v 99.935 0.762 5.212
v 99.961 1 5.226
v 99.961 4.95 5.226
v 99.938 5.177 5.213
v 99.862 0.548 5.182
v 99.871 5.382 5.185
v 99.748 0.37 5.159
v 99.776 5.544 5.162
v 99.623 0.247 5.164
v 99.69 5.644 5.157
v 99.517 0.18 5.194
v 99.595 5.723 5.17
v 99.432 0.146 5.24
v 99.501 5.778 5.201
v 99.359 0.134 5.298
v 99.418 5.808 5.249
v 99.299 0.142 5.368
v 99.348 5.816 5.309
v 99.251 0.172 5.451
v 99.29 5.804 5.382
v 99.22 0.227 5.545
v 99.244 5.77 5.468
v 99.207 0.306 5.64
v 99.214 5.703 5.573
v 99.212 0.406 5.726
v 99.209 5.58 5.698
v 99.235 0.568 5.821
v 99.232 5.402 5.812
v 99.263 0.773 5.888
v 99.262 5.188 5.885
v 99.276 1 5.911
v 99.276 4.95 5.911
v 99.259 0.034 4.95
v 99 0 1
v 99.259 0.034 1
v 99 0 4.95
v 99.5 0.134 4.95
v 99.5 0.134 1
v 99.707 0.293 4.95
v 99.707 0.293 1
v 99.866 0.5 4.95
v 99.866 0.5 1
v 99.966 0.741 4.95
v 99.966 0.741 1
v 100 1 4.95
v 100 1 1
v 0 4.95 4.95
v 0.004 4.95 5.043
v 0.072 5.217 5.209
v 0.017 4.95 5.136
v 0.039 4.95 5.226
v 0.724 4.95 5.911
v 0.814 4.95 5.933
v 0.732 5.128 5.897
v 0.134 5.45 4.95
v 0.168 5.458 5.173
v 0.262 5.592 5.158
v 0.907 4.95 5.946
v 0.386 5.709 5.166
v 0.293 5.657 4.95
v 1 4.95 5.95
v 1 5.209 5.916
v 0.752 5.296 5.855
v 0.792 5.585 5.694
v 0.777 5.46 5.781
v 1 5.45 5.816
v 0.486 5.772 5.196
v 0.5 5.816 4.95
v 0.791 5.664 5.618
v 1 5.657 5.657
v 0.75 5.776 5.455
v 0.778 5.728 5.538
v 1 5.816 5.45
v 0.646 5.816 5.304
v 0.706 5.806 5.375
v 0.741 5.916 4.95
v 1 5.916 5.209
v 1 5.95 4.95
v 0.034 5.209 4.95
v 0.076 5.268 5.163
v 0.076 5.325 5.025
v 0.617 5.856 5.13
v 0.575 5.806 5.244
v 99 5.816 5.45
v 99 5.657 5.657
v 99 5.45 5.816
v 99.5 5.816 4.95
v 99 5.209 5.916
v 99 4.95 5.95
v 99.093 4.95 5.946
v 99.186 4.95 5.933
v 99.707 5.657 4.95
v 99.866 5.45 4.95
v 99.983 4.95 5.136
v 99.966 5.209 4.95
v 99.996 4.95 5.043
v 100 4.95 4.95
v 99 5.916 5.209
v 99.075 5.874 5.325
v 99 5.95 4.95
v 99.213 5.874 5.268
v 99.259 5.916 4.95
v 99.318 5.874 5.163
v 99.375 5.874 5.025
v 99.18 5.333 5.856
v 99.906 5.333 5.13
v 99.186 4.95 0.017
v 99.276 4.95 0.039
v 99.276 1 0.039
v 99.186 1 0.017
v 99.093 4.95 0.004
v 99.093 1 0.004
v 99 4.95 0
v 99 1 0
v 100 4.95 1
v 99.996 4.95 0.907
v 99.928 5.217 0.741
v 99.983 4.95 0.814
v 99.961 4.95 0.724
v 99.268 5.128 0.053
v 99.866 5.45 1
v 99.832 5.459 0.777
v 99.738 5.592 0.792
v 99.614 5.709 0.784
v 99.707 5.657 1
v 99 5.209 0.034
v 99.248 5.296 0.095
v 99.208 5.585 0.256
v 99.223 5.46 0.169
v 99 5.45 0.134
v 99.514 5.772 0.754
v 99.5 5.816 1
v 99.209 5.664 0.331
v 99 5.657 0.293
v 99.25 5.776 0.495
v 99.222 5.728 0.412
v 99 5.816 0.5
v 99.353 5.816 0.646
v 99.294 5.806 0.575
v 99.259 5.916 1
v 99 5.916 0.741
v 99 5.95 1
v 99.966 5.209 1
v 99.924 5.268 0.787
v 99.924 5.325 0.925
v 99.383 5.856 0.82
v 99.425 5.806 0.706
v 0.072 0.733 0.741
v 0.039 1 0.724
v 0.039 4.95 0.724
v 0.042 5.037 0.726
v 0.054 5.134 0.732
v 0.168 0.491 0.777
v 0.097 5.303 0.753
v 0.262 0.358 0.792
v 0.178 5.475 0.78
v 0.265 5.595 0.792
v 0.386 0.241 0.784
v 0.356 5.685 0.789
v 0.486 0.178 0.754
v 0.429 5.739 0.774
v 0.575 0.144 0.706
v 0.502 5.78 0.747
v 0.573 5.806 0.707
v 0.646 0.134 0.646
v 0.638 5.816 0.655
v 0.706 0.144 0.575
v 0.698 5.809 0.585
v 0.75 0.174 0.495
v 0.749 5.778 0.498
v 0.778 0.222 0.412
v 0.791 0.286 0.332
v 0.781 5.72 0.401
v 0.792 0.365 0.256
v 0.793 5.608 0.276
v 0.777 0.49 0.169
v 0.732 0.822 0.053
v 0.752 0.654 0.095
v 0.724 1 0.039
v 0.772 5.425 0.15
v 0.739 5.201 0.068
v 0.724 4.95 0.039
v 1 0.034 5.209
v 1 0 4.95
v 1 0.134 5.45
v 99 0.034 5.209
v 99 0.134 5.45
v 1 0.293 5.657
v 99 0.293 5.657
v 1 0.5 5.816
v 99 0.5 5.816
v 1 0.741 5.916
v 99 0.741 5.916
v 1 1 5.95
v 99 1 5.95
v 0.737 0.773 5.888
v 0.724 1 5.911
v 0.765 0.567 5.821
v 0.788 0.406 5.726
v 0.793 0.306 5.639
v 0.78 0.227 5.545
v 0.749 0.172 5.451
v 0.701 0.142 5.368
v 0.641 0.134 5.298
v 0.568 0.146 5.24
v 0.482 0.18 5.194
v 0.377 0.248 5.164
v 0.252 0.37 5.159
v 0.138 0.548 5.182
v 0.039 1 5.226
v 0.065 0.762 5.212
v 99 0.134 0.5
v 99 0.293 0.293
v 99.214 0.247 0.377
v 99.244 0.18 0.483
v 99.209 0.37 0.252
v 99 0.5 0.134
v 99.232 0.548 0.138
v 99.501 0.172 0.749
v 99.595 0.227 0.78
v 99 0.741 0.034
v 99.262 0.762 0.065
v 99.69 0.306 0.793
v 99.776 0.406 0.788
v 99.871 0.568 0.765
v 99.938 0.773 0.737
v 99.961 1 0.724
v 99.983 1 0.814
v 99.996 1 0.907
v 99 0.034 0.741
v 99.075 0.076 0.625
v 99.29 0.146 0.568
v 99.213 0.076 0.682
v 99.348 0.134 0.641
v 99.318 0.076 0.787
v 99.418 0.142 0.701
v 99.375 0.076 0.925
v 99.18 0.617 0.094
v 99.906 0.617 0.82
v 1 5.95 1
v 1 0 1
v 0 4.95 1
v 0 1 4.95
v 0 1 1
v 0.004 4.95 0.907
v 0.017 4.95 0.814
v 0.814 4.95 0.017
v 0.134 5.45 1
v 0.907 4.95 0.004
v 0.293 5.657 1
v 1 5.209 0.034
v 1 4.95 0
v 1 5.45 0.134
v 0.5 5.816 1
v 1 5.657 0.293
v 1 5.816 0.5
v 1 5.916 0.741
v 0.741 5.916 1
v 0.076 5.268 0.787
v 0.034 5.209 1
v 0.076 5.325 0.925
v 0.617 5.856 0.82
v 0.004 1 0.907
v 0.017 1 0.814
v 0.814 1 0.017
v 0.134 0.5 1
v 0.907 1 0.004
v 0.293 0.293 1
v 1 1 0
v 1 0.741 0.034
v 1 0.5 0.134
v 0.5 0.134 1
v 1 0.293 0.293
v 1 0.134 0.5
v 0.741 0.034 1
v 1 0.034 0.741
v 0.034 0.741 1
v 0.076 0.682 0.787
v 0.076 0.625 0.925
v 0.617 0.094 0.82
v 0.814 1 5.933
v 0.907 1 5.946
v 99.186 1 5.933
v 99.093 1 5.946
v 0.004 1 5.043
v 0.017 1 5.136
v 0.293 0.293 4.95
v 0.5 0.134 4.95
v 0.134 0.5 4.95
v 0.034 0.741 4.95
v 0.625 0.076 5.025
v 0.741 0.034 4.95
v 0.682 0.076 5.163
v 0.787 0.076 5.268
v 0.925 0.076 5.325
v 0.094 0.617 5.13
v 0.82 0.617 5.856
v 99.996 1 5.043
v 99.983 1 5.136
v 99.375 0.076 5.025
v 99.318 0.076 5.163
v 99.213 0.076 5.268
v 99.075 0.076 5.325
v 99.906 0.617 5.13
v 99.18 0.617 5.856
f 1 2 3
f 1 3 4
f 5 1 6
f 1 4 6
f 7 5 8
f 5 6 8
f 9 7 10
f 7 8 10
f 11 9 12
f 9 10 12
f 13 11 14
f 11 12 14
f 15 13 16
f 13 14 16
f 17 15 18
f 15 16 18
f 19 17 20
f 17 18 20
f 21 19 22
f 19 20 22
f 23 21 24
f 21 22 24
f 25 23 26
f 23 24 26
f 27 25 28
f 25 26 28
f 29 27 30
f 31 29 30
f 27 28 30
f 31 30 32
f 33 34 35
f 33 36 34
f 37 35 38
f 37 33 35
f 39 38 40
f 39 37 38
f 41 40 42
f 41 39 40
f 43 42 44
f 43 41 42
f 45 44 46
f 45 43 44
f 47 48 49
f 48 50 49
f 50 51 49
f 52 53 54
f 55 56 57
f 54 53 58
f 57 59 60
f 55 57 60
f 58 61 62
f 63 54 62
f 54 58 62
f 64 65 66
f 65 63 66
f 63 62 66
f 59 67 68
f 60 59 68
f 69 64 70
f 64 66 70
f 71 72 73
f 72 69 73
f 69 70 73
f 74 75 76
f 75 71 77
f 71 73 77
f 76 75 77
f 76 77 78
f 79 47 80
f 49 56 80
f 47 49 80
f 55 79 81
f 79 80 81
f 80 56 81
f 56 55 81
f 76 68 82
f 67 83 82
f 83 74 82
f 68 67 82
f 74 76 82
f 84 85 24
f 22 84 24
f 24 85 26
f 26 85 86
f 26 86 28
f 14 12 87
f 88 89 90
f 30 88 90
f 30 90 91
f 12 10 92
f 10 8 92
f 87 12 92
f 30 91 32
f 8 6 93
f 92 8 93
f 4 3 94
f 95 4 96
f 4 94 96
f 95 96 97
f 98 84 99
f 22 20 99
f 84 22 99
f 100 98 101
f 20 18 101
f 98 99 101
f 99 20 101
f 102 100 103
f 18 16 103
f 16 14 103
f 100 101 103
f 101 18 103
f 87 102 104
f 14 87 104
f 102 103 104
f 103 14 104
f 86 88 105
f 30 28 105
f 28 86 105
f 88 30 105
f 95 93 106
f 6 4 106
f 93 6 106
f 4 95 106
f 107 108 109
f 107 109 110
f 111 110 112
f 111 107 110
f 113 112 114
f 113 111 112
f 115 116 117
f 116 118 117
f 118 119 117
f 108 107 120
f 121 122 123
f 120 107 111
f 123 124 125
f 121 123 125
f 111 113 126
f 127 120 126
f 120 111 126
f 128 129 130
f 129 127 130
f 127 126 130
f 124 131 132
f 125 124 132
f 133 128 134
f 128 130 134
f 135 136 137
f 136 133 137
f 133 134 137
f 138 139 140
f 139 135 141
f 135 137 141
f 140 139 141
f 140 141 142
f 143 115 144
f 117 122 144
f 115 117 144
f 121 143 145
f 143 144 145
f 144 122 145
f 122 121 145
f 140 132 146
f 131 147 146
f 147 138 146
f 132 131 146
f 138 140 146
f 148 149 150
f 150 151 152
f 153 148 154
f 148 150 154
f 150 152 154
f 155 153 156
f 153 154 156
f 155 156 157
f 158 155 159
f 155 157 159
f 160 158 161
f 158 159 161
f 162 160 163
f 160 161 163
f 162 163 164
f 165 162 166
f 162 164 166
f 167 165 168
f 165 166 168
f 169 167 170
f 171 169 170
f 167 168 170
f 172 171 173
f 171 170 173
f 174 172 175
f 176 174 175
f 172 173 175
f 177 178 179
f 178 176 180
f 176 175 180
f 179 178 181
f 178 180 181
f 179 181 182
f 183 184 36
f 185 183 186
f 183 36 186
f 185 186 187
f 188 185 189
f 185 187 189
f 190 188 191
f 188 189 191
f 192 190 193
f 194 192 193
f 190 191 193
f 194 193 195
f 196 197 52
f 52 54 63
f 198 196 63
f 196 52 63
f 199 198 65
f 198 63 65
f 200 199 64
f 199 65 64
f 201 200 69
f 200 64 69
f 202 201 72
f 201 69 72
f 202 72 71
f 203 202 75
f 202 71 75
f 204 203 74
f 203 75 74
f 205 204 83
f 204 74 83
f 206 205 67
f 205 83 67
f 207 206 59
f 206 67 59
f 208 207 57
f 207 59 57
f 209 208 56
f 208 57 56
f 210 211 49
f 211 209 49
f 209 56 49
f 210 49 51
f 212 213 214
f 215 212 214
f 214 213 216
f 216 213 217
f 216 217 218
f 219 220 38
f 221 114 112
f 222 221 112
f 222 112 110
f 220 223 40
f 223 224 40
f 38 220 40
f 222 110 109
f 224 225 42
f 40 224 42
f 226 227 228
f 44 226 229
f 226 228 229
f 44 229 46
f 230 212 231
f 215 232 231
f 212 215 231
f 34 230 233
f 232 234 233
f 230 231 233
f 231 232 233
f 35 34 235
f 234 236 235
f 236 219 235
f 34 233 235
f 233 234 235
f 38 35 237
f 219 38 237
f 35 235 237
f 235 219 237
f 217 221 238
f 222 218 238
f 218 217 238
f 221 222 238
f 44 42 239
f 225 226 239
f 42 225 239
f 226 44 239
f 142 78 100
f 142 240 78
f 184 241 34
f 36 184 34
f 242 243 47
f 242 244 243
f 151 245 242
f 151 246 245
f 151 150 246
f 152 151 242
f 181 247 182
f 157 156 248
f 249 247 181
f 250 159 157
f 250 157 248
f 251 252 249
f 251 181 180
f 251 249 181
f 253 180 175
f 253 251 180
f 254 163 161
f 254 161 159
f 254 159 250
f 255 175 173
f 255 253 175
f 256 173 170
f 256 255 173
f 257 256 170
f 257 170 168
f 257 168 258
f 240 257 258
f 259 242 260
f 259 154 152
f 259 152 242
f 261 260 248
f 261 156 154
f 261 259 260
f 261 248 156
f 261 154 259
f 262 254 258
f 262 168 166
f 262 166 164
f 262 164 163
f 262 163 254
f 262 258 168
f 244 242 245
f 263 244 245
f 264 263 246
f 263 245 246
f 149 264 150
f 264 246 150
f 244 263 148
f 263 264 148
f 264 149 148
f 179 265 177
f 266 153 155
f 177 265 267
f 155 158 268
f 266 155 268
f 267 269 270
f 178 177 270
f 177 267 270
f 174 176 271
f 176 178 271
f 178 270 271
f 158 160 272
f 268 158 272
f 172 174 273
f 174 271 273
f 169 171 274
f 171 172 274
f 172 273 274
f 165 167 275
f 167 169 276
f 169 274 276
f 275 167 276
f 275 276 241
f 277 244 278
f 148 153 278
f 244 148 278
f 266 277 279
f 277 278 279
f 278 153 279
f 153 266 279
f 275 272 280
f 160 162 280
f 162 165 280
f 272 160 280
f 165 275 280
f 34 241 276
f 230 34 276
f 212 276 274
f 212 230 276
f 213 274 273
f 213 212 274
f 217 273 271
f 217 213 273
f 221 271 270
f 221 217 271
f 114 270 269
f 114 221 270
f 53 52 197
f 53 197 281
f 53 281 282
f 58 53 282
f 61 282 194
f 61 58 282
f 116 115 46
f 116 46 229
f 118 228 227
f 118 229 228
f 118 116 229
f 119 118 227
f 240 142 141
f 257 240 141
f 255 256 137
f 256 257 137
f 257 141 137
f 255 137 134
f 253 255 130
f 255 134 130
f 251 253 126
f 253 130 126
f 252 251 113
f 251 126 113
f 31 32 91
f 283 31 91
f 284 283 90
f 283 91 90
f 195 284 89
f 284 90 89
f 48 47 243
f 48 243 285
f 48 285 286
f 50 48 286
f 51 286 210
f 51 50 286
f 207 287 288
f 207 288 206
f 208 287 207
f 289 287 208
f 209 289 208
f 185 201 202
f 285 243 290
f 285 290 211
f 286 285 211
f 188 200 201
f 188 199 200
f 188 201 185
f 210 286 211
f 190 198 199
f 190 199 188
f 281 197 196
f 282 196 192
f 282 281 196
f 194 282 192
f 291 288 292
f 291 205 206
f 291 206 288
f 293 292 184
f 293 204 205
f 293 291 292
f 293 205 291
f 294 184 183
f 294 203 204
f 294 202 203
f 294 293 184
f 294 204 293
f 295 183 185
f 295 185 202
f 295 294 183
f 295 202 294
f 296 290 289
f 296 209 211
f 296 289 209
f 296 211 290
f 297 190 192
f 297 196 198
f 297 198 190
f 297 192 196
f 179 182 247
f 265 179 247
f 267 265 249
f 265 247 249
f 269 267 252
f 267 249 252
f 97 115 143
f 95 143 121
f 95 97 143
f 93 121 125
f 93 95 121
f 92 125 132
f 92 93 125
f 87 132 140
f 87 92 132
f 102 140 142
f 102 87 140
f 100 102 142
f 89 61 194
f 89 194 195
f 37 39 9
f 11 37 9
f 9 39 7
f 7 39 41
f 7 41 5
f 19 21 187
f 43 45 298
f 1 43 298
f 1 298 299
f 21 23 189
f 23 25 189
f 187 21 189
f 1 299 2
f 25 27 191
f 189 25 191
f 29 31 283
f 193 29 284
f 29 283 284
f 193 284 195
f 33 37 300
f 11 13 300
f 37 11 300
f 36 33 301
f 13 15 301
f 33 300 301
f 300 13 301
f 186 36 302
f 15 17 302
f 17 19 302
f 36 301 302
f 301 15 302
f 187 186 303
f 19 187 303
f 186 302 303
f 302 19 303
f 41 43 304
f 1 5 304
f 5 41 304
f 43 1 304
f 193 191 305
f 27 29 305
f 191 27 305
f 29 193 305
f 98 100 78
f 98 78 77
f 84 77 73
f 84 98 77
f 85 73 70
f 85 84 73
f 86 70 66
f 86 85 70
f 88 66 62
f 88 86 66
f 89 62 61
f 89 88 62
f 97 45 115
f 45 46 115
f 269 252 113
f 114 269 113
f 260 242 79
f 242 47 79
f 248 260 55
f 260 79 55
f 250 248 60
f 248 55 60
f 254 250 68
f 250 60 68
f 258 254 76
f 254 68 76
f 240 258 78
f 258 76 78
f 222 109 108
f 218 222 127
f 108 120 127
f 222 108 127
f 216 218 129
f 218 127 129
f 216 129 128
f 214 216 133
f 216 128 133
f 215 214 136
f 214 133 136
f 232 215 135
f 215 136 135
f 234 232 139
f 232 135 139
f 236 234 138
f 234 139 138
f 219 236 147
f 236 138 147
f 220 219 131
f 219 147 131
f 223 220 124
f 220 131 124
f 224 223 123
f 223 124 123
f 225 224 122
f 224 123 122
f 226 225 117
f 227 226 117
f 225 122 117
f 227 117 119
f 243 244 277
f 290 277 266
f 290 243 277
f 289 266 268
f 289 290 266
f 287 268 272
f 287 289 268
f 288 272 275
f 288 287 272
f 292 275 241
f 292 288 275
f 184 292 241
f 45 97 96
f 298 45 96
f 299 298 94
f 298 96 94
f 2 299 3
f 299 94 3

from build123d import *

# Parameters (mm, degrees)
SKETCH1_W           = 100
SKETCH1_H           = 5.95
BOSS_EXTRUDE1_DEPTH = 5.95
FILLET1_R           = 1
SKETCH2_R           = 0.5
CUT_EXTRUDE1_DEPTH  = 10


with BuildPart() as part:
    # Sketch1 → Boss-Extrude1 (new body)
    with BuildSketch(Plane.XY):
        with Locations((50, 2.975)):
            Rectangle(SKETCH1_W, SKETCH1_H)
    extrude(amount=BOSS_EXTRUDE1_DEPTH)

    # Fillet1
    fillet1_edges = [part.edges().sort_by_distance(p)[0] for p in [
        (100, 2.975, 5.95),
        (50, 5.95, 5.95),
        (0, 2.975, 5.95),
        (50, 5.95, 0),
        (100, 2.975, 0),
        (50, 0, 0),
        (0, 2.975, 0),
        (0, 5.95, 2.975),
        (100, 5.95, 2.975),
        (100, 0, 2.975),
        (0, 0, 2.975),
        (50, 0, 5.95),
    ]]
    fillet(fillet1_edges, radius=FILLET1_R)

    # Sketch2 → Cut-Extrude1 (cut)
    with BuildSketch(Plane(origin=(0, 5.95, 0), x_dir=(1, 0, 0), z_dir=(0, 1, 0))):
        with Locations((99.707106781, -0.292893219)):
            Circle(SKETCH2_R)
        with Locations((99.707106781, -5.657106781)):
            Circle(SKETCH2_R)
        with Locations((0.292893219, -0.292893219)):
            Circle(SKETCH2_R)
        with Locations((0.292893219, -5.657106781)):
            Circle(SKETCH2_R)
    extrude(amount=-CUT_EXTRUDE1_DEPTH, mode=Mode.SUBTRACT)


solid = part.part
